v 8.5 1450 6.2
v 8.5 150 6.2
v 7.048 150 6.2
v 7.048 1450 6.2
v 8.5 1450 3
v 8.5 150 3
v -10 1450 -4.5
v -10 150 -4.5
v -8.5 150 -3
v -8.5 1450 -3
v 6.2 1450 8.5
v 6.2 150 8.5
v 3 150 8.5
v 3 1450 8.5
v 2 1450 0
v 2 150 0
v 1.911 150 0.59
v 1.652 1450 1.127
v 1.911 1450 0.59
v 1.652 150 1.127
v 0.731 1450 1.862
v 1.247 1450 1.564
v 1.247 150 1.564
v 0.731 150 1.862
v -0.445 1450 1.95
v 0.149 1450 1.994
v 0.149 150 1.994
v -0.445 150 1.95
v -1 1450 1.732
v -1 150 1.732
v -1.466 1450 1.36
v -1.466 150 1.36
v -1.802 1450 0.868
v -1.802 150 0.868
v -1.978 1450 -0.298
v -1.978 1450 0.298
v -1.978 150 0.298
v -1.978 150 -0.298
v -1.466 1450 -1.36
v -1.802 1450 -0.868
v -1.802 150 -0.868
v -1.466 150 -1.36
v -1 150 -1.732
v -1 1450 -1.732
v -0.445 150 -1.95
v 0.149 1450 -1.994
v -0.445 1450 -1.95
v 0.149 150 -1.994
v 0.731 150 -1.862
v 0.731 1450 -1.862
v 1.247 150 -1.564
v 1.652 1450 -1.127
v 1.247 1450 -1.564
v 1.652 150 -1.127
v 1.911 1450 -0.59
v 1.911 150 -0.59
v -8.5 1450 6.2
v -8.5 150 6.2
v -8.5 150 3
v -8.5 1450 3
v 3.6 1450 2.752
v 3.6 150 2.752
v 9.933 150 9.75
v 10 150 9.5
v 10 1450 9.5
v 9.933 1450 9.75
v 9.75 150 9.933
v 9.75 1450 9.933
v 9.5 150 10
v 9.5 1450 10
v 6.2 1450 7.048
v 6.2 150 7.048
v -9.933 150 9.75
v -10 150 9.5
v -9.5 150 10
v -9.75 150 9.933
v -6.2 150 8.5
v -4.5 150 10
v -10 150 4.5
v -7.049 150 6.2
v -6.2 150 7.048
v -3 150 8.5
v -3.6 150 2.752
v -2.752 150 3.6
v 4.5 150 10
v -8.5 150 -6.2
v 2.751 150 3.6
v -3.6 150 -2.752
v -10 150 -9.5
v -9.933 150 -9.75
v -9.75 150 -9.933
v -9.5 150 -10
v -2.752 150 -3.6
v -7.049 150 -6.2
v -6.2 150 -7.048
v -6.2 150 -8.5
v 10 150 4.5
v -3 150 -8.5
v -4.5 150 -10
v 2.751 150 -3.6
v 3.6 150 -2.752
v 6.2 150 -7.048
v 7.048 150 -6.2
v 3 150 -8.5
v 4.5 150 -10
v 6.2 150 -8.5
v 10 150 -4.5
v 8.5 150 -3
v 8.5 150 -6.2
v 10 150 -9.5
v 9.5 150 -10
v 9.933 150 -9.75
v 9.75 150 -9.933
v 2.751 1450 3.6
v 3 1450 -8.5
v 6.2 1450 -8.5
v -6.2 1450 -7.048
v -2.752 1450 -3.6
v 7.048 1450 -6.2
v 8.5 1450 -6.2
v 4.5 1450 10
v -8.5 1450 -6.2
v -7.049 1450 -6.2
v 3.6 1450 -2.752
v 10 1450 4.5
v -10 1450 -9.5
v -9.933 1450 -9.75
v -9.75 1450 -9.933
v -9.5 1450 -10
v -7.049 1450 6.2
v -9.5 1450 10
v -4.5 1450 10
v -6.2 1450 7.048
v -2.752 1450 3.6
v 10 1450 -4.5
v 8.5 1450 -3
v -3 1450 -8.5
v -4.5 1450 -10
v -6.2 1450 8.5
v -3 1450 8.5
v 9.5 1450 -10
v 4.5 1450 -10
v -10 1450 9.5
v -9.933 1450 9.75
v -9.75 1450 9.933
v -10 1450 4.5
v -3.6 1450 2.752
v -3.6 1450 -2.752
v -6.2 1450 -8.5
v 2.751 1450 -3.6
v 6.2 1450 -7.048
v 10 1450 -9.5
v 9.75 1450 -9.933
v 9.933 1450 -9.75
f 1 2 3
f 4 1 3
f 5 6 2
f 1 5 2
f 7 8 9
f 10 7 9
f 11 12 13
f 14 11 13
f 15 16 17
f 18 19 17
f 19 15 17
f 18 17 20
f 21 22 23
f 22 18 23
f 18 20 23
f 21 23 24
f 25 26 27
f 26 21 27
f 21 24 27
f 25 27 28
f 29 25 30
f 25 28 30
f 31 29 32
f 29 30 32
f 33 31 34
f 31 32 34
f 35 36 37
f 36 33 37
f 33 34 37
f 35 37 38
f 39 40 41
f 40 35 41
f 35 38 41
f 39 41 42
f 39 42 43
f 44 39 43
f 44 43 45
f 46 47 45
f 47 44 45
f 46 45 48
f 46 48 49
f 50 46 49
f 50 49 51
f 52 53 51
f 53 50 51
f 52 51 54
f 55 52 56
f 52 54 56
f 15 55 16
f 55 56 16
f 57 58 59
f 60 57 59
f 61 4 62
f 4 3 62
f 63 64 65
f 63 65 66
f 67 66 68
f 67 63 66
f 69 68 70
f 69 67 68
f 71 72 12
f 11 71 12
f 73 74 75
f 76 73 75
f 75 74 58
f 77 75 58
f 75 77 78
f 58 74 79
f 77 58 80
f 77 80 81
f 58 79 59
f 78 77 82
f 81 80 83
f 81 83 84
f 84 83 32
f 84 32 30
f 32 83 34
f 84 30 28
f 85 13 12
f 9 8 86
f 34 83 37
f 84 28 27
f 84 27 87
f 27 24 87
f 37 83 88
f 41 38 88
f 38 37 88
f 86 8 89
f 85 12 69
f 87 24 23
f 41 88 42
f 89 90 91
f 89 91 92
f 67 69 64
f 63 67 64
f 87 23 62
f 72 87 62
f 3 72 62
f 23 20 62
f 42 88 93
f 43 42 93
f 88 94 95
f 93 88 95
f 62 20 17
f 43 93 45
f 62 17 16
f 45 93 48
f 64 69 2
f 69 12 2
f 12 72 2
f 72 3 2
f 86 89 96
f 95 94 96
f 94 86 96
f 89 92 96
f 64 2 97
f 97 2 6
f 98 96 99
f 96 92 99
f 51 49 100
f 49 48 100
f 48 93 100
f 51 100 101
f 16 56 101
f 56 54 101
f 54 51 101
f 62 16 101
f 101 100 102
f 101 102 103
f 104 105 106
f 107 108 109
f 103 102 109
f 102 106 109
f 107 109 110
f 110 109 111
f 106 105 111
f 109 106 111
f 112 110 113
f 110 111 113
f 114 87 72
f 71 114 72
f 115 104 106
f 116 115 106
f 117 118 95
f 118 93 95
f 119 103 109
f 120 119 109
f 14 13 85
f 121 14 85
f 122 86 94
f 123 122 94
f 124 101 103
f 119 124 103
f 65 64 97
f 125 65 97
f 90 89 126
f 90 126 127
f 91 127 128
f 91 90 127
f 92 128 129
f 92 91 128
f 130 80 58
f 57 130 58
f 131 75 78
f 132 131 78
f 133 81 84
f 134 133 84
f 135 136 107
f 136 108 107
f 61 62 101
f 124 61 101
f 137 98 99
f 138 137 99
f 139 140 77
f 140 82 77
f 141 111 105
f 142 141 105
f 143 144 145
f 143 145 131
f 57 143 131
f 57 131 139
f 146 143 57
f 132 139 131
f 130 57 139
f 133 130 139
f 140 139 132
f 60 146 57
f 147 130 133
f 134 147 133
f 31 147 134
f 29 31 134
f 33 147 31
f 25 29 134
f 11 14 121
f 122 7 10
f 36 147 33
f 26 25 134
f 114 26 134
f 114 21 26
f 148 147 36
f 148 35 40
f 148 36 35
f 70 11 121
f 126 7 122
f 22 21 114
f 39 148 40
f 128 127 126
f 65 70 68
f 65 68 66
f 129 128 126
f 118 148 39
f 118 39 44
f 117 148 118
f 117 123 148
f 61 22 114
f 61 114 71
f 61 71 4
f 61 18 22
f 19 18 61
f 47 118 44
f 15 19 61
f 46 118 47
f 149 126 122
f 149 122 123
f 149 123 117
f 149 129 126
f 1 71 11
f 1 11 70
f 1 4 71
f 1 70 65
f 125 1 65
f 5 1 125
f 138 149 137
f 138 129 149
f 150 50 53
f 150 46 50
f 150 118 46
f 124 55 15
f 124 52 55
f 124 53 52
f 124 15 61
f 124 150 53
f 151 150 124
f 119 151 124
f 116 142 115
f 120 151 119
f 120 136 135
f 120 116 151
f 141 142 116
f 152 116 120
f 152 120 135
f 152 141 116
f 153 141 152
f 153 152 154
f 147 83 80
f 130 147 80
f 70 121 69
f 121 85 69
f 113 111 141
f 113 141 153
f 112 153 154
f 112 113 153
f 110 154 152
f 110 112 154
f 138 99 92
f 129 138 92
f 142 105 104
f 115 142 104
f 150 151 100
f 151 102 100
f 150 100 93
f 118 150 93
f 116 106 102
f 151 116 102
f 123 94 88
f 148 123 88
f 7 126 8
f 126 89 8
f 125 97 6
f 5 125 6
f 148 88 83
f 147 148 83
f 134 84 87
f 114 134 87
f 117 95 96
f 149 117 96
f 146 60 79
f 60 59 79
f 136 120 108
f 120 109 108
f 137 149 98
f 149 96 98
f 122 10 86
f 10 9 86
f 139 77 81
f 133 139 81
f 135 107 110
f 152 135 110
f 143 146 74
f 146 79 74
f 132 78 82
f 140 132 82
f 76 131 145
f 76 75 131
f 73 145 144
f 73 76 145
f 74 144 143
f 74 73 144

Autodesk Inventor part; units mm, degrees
ref_plane "YZ Plane" through (0, 0, 0) normal (1, 0, 0) x (0, 1, 0)
ref_plane "XZ Plane" through (0, 0, 0) normal (0, 1, 0) x (-1, 0, 0)
ref_plane "Work Plane1" through (-2.7515, 150, 3.6) normal (0, 1, 0) x (1, 0, 0)
sketch "Sketch1" plane through (-2.7515, 150, 3.6) normal (0, 1, 0) x (1, 0, 0)
  arc A0 (-6.7485, 13.6) -> (-7.2485, 13.1) centre (-6.7485, 13.1) ccw projected
  line L0 (-7.2485, 13.1) -> (-7.2485, 8.1) projected
  line L1 (-7.2485, 8.1) -> (-5.7485, 6.6) projected
  line L2 (-5.7485, 6.6) -> (-5.7485, 9.8) projected
  line L3 (-5.7485, 9.8) -> (-4.2971, 9.8) projected
  line L4 (-4.2971, 9.8) -> (-0.8485, 6.3515) projected
  line L5 (-0.8485, 6.3515) -> (-0.8485, 0.8485) projected
  line L6 (-0.8485, 0.8485) -> (-4.2971, -2.6) projected
  line L7 (-4.2971, -2.6) -> (-5.7485, -2.6) projected
  line L8 (-5.7485, -2.6) -> (-5.7485, 0.6) projected
  line L9 (-5.7485, 0.6) -> (-7.2485, -0.9) projected
  line L10 (-7.2485, -0.9) -> (-7.2485, -5.9) projected
  arc A1 (-7.2485, -5.9) -> (-6.7485, -6.4) centre (-6.7485, -5.9) ccw projected
  line L11 (-6.7485, -6.4) -> (-1.7485, -6.4) projected
  line L12 (-1.7485, -6.4) -> (-0.2485, -4.9) projected
  line L13 (-0.2485, -4.9) -> (-3.4485, -4.9) projected
  line L14 (-3.4485, -4.9) -> (-3.4485, -3.4485) projected
  line L15 (-3.4485, -3.4485) -> (0, 0) projected
  line L16 (0, 0) -> (5.5029, 0) projected
  line L17 (5.5029, 0) -> (8.9515, -3.4485) projected
  line L18 (8.9515, -3.4485) -> (8.9515, -4.9) projected
  line L19 (8.9515, -4.9) -> (5.7515, -4.9) projected
  line L20 (5.7515, -4.9) -> (7.2515, -6.4) projected
  line L21 (7.2515, -6.4) -> (12.2515, -6.4) projected
  arc A2 (12.2515, -6.4) -> (12.7515, -5.9) centre (12.2515, -5.9) ccw projected
  line L22 (12.7515, -5.9) -> (12.7515, -0.9) projected
  line L23 (12.7515, -0.9) -> (11.2515, 0.6) projected
  line L24 (11.2515, 0.6) -> (11.2515, -2.6) projected
  line L25 (11.2515, -2.6) -> (9.8, -2.6) projected
  line L26 (9.8, -2.6) -> (6.3515, 0.8485) projected
  line L27 (6.3515, 0.8485) -> (6.3515, 6.3515) projected
  line L28 (6.3515, 6.3515) -> (9.8, 9.8) projected
  line L29 (9.8, 9.8) -> (11.2515, 9.8) projected
  line L30 (11.2515, 9.8) -> (11.2515, 6.6) projected
  line L31 (11.2515, 6.6) -> (12.7515, 8.1) projected
  line L32 (12.7515, 8.1) -> (12.7515, 13.1) projected
  arc A3 (12.7515, 13.1) -> (12.2515, 13.6) centre (12.2515, 13.1) ccw projected
  line L33 (12.2515, 13.6) -> (7.2515, 13.6) projected
  line L34 (7.2515, 13.6) -> (5.7515, 12.1) projected
  line L35 (5.7515, 12.1) -> (8.9515, 12.1) projected
  line L36 (8.9515, 12.1) -> (8.9515, 10.6485) projected
  line L37 (8.9515, 10.6485) -> (5.5029, 7.2) projected
  line L38 (5.5029, 7.2) -> (0, 7.2) projected
  line L39 (0, 7.2) -> (-3.4485, 10.6485) projected
  line L40 (-3.4485, 10.6485) -> (-3.4485, 12.1) projected
  line L41 (-3.4485, 12.1) -> (-0.2485, 12.1) projected
  line L42 (-0.2485, 12.1) -> (-1.7485, 13.6) projected
  line L43 (-1.7485, 13.6) -> (-6.7485, 13.6) projected
  circle A4 centre (2.7515, 3.6) radius 2 projected
extrude "Extrusion1" add sketch "Sketch1" along normal blind 1300
ref_plane "Work Plane2" through (0, 150, 4.5) normal (1, 0, 0) x (0, 0, -1)
properties part number "20x20mmx150mm alminum profile" material "Aluminum 6061"
